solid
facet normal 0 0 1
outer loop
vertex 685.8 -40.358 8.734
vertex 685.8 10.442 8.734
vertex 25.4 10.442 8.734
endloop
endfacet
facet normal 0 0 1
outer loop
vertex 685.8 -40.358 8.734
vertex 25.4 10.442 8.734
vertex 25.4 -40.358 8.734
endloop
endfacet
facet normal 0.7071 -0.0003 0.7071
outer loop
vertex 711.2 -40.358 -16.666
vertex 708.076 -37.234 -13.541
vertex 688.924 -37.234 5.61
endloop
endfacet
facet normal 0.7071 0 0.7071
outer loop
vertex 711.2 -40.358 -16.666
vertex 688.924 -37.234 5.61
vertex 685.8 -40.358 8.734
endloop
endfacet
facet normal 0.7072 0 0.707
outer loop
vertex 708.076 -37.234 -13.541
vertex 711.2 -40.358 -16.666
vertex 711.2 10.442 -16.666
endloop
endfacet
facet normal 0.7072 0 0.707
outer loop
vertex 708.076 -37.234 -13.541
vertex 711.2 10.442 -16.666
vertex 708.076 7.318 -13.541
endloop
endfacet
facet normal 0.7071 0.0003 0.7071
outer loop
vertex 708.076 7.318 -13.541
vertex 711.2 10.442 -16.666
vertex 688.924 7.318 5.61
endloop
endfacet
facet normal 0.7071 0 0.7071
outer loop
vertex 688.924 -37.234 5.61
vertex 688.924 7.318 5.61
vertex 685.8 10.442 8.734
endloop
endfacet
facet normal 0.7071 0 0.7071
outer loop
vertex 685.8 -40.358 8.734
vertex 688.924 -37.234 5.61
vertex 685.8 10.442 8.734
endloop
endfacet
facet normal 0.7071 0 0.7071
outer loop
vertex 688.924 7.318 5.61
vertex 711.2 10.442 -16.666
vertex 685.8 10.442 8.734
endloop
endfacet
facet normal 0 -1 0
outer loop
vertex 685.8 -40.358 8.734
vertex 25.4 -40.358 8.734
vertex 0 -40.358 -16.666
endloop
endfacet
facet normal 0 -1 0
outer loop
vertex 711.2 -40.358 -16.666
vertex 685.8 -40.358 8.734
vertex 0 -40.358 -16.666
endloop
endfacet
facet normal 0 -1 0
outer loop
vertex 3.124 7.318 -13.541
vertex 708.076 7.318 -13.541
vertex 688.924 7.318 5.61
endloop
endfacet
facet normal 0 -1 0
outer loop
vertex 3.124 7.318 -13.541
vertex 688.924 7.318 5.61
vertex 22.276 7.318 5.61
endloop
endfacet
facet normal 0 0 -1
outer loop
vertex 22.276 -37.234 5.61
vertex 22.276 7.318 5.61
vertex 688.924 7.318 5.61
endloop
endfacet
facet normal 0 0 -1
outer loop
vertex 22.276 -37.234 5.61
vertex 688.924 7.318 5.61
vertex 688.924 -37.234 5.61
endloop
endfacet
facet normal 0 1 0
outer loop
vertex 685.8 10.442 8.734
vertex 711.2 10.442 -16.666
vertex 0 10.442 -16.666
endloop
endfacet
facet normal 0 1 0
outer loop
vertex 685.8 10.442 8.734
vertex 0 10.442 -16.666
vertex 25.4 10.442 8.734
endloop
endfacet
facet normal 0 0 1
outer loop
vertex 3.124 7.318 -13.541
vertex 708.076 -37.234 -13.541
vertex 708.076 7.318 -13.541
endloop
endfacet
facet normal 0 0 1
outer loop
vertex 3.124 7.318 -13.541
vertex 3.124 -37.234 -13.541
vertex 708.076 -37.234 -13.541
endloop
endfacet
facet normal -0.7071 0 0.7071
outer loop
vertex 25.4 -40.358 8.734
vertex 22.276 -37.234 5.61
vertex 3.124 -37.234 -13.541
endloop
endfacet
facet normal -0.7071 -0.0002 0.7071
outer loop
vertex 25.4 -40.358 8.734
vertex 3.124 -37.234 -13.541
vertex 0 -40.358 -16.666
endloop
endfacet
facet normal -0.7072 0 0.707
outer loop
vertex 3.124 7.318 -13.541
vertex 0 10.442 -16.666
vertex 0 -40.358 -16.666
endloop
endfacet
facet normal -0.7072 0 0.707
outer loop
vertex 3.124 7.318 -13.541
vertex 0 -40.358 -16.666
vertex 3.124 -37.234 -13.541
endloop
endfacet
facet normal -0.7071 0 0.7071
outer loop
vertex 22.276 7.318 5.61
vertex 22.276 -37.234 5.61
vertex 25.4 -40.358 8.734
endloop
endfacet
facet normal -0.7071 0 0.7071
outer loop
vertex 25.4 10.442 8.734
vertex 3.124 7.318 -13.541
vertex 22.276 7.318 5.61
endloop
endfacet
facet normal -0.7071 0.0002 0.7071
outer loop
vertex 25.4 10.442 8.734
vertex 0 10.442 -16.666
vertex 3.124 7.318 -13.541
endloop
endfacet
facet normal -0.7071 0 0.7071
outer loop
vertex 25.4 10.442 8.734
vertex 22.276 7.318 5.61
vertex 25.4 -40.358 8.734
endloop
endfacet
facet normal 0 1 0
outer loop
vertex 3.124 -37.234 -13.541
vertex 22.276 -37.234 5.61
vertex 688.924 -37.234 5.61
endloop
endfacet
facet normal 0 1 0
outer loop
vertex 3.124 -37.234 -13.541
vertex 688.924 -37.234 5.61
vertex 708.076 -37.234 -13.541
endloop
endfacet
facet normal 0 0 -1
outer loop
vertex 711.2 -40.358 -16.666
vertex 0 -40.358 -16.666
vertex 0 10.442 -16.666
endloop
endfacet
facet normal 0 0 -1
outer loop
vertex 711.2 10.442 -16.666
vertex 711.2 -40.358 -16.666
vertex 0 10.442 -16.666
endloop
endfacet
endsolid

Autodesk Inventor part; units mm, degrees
ref_plane "YZ Plane" through (0, 0, 0) normal (1, 0, 0) x (0, 1, 0)
ref_plane "XZ Plane" through (0, 0, 0) normal (0, 1, 0) x (-1, 0, 0)
ref_plane "XY Plane" through (0, 0, 0) normal (0, 0, 1) x (1, 0, 0)
sketch "Sketch1" plane through (0, 0, 0) normal (1, 0, 0) x (0, 1, 0)
  line L0 (10.4423, 8.7344) -> (-40.3577, 8.7344)
  line L1 (-40.3577, 8.7344) -> (-40.3577, -16.6656)
  line L2 (-40.3577, -16.6656) -> (10.4423, -16.6656)
  line L3 (10.4423, -16.6656) -> (10.4423, 8.7344)
  line L4 (7.3181, 5.6102) -> (-37.2335, 5.6102)
  line L5 (-37.2335, 5.6102) -> (-37.2335, -13.5414)
  line L6 (-37.2335, -13.5414) -> (7.3181, -13.5414)
  line L7 (7.3181, -13.5414) -> (7.3181, 5.6102)
  point P0 (0, 0)
  dimension "d0" = 50.8
  dimension "d1" = 25.4
  dimension "d2" = 3.1242
extrude "Extrusion1" add sketch "Sketch1" along normal blind 711.2
sketch "Sketch2" plane through (0, 10.4423, 8.7344) normal (0, 1, 0) x (1, 0, 0)
  line L0 (0, 25.4) -> (22.2758, 3.1242)
  line L1 (0, 3.1242) -> (711.2, 3.1242) projected
  line L2 (0, 25.4) -> (31.5027, 25.4) construction
  line L3 (22.2758, 3.1242) -> (38.5716, -13.1716)
  line L4 (0, 0) -> (711.2, 0) projected
  line L5 (25.4, 0) -> (0, 0)
  line L6 (0, 0) -> (0, 25.4)
  line L7 (711.2, 25.4) -> (678.2071, -7.5929)
  line L8 (711.2, 25.4) -> (757.859, 25.4) construction
  line L9 (685.8, 0) -> (711.2, 0)
  line L10 (711.2, 0) -> (711.2, 25.4)
  line L11 (711.2, 25.4) -> (711.2, 0) projected
  point P0 (0, 8.7344)
  dimension "d5" = 45
  dimension "d6" = 135
extrude "Extrusion2" cut sketch "Sketch2" against normal blind 711.2 contours L0 L1 L6 | L3 L4 L6 L1
extrude "Extrusion3" cut sketch "Sketch2" against normal blind 711.2 contours L7 L10 L1 | L1 L10 L4 L7
properties part number "28in 1x2"
